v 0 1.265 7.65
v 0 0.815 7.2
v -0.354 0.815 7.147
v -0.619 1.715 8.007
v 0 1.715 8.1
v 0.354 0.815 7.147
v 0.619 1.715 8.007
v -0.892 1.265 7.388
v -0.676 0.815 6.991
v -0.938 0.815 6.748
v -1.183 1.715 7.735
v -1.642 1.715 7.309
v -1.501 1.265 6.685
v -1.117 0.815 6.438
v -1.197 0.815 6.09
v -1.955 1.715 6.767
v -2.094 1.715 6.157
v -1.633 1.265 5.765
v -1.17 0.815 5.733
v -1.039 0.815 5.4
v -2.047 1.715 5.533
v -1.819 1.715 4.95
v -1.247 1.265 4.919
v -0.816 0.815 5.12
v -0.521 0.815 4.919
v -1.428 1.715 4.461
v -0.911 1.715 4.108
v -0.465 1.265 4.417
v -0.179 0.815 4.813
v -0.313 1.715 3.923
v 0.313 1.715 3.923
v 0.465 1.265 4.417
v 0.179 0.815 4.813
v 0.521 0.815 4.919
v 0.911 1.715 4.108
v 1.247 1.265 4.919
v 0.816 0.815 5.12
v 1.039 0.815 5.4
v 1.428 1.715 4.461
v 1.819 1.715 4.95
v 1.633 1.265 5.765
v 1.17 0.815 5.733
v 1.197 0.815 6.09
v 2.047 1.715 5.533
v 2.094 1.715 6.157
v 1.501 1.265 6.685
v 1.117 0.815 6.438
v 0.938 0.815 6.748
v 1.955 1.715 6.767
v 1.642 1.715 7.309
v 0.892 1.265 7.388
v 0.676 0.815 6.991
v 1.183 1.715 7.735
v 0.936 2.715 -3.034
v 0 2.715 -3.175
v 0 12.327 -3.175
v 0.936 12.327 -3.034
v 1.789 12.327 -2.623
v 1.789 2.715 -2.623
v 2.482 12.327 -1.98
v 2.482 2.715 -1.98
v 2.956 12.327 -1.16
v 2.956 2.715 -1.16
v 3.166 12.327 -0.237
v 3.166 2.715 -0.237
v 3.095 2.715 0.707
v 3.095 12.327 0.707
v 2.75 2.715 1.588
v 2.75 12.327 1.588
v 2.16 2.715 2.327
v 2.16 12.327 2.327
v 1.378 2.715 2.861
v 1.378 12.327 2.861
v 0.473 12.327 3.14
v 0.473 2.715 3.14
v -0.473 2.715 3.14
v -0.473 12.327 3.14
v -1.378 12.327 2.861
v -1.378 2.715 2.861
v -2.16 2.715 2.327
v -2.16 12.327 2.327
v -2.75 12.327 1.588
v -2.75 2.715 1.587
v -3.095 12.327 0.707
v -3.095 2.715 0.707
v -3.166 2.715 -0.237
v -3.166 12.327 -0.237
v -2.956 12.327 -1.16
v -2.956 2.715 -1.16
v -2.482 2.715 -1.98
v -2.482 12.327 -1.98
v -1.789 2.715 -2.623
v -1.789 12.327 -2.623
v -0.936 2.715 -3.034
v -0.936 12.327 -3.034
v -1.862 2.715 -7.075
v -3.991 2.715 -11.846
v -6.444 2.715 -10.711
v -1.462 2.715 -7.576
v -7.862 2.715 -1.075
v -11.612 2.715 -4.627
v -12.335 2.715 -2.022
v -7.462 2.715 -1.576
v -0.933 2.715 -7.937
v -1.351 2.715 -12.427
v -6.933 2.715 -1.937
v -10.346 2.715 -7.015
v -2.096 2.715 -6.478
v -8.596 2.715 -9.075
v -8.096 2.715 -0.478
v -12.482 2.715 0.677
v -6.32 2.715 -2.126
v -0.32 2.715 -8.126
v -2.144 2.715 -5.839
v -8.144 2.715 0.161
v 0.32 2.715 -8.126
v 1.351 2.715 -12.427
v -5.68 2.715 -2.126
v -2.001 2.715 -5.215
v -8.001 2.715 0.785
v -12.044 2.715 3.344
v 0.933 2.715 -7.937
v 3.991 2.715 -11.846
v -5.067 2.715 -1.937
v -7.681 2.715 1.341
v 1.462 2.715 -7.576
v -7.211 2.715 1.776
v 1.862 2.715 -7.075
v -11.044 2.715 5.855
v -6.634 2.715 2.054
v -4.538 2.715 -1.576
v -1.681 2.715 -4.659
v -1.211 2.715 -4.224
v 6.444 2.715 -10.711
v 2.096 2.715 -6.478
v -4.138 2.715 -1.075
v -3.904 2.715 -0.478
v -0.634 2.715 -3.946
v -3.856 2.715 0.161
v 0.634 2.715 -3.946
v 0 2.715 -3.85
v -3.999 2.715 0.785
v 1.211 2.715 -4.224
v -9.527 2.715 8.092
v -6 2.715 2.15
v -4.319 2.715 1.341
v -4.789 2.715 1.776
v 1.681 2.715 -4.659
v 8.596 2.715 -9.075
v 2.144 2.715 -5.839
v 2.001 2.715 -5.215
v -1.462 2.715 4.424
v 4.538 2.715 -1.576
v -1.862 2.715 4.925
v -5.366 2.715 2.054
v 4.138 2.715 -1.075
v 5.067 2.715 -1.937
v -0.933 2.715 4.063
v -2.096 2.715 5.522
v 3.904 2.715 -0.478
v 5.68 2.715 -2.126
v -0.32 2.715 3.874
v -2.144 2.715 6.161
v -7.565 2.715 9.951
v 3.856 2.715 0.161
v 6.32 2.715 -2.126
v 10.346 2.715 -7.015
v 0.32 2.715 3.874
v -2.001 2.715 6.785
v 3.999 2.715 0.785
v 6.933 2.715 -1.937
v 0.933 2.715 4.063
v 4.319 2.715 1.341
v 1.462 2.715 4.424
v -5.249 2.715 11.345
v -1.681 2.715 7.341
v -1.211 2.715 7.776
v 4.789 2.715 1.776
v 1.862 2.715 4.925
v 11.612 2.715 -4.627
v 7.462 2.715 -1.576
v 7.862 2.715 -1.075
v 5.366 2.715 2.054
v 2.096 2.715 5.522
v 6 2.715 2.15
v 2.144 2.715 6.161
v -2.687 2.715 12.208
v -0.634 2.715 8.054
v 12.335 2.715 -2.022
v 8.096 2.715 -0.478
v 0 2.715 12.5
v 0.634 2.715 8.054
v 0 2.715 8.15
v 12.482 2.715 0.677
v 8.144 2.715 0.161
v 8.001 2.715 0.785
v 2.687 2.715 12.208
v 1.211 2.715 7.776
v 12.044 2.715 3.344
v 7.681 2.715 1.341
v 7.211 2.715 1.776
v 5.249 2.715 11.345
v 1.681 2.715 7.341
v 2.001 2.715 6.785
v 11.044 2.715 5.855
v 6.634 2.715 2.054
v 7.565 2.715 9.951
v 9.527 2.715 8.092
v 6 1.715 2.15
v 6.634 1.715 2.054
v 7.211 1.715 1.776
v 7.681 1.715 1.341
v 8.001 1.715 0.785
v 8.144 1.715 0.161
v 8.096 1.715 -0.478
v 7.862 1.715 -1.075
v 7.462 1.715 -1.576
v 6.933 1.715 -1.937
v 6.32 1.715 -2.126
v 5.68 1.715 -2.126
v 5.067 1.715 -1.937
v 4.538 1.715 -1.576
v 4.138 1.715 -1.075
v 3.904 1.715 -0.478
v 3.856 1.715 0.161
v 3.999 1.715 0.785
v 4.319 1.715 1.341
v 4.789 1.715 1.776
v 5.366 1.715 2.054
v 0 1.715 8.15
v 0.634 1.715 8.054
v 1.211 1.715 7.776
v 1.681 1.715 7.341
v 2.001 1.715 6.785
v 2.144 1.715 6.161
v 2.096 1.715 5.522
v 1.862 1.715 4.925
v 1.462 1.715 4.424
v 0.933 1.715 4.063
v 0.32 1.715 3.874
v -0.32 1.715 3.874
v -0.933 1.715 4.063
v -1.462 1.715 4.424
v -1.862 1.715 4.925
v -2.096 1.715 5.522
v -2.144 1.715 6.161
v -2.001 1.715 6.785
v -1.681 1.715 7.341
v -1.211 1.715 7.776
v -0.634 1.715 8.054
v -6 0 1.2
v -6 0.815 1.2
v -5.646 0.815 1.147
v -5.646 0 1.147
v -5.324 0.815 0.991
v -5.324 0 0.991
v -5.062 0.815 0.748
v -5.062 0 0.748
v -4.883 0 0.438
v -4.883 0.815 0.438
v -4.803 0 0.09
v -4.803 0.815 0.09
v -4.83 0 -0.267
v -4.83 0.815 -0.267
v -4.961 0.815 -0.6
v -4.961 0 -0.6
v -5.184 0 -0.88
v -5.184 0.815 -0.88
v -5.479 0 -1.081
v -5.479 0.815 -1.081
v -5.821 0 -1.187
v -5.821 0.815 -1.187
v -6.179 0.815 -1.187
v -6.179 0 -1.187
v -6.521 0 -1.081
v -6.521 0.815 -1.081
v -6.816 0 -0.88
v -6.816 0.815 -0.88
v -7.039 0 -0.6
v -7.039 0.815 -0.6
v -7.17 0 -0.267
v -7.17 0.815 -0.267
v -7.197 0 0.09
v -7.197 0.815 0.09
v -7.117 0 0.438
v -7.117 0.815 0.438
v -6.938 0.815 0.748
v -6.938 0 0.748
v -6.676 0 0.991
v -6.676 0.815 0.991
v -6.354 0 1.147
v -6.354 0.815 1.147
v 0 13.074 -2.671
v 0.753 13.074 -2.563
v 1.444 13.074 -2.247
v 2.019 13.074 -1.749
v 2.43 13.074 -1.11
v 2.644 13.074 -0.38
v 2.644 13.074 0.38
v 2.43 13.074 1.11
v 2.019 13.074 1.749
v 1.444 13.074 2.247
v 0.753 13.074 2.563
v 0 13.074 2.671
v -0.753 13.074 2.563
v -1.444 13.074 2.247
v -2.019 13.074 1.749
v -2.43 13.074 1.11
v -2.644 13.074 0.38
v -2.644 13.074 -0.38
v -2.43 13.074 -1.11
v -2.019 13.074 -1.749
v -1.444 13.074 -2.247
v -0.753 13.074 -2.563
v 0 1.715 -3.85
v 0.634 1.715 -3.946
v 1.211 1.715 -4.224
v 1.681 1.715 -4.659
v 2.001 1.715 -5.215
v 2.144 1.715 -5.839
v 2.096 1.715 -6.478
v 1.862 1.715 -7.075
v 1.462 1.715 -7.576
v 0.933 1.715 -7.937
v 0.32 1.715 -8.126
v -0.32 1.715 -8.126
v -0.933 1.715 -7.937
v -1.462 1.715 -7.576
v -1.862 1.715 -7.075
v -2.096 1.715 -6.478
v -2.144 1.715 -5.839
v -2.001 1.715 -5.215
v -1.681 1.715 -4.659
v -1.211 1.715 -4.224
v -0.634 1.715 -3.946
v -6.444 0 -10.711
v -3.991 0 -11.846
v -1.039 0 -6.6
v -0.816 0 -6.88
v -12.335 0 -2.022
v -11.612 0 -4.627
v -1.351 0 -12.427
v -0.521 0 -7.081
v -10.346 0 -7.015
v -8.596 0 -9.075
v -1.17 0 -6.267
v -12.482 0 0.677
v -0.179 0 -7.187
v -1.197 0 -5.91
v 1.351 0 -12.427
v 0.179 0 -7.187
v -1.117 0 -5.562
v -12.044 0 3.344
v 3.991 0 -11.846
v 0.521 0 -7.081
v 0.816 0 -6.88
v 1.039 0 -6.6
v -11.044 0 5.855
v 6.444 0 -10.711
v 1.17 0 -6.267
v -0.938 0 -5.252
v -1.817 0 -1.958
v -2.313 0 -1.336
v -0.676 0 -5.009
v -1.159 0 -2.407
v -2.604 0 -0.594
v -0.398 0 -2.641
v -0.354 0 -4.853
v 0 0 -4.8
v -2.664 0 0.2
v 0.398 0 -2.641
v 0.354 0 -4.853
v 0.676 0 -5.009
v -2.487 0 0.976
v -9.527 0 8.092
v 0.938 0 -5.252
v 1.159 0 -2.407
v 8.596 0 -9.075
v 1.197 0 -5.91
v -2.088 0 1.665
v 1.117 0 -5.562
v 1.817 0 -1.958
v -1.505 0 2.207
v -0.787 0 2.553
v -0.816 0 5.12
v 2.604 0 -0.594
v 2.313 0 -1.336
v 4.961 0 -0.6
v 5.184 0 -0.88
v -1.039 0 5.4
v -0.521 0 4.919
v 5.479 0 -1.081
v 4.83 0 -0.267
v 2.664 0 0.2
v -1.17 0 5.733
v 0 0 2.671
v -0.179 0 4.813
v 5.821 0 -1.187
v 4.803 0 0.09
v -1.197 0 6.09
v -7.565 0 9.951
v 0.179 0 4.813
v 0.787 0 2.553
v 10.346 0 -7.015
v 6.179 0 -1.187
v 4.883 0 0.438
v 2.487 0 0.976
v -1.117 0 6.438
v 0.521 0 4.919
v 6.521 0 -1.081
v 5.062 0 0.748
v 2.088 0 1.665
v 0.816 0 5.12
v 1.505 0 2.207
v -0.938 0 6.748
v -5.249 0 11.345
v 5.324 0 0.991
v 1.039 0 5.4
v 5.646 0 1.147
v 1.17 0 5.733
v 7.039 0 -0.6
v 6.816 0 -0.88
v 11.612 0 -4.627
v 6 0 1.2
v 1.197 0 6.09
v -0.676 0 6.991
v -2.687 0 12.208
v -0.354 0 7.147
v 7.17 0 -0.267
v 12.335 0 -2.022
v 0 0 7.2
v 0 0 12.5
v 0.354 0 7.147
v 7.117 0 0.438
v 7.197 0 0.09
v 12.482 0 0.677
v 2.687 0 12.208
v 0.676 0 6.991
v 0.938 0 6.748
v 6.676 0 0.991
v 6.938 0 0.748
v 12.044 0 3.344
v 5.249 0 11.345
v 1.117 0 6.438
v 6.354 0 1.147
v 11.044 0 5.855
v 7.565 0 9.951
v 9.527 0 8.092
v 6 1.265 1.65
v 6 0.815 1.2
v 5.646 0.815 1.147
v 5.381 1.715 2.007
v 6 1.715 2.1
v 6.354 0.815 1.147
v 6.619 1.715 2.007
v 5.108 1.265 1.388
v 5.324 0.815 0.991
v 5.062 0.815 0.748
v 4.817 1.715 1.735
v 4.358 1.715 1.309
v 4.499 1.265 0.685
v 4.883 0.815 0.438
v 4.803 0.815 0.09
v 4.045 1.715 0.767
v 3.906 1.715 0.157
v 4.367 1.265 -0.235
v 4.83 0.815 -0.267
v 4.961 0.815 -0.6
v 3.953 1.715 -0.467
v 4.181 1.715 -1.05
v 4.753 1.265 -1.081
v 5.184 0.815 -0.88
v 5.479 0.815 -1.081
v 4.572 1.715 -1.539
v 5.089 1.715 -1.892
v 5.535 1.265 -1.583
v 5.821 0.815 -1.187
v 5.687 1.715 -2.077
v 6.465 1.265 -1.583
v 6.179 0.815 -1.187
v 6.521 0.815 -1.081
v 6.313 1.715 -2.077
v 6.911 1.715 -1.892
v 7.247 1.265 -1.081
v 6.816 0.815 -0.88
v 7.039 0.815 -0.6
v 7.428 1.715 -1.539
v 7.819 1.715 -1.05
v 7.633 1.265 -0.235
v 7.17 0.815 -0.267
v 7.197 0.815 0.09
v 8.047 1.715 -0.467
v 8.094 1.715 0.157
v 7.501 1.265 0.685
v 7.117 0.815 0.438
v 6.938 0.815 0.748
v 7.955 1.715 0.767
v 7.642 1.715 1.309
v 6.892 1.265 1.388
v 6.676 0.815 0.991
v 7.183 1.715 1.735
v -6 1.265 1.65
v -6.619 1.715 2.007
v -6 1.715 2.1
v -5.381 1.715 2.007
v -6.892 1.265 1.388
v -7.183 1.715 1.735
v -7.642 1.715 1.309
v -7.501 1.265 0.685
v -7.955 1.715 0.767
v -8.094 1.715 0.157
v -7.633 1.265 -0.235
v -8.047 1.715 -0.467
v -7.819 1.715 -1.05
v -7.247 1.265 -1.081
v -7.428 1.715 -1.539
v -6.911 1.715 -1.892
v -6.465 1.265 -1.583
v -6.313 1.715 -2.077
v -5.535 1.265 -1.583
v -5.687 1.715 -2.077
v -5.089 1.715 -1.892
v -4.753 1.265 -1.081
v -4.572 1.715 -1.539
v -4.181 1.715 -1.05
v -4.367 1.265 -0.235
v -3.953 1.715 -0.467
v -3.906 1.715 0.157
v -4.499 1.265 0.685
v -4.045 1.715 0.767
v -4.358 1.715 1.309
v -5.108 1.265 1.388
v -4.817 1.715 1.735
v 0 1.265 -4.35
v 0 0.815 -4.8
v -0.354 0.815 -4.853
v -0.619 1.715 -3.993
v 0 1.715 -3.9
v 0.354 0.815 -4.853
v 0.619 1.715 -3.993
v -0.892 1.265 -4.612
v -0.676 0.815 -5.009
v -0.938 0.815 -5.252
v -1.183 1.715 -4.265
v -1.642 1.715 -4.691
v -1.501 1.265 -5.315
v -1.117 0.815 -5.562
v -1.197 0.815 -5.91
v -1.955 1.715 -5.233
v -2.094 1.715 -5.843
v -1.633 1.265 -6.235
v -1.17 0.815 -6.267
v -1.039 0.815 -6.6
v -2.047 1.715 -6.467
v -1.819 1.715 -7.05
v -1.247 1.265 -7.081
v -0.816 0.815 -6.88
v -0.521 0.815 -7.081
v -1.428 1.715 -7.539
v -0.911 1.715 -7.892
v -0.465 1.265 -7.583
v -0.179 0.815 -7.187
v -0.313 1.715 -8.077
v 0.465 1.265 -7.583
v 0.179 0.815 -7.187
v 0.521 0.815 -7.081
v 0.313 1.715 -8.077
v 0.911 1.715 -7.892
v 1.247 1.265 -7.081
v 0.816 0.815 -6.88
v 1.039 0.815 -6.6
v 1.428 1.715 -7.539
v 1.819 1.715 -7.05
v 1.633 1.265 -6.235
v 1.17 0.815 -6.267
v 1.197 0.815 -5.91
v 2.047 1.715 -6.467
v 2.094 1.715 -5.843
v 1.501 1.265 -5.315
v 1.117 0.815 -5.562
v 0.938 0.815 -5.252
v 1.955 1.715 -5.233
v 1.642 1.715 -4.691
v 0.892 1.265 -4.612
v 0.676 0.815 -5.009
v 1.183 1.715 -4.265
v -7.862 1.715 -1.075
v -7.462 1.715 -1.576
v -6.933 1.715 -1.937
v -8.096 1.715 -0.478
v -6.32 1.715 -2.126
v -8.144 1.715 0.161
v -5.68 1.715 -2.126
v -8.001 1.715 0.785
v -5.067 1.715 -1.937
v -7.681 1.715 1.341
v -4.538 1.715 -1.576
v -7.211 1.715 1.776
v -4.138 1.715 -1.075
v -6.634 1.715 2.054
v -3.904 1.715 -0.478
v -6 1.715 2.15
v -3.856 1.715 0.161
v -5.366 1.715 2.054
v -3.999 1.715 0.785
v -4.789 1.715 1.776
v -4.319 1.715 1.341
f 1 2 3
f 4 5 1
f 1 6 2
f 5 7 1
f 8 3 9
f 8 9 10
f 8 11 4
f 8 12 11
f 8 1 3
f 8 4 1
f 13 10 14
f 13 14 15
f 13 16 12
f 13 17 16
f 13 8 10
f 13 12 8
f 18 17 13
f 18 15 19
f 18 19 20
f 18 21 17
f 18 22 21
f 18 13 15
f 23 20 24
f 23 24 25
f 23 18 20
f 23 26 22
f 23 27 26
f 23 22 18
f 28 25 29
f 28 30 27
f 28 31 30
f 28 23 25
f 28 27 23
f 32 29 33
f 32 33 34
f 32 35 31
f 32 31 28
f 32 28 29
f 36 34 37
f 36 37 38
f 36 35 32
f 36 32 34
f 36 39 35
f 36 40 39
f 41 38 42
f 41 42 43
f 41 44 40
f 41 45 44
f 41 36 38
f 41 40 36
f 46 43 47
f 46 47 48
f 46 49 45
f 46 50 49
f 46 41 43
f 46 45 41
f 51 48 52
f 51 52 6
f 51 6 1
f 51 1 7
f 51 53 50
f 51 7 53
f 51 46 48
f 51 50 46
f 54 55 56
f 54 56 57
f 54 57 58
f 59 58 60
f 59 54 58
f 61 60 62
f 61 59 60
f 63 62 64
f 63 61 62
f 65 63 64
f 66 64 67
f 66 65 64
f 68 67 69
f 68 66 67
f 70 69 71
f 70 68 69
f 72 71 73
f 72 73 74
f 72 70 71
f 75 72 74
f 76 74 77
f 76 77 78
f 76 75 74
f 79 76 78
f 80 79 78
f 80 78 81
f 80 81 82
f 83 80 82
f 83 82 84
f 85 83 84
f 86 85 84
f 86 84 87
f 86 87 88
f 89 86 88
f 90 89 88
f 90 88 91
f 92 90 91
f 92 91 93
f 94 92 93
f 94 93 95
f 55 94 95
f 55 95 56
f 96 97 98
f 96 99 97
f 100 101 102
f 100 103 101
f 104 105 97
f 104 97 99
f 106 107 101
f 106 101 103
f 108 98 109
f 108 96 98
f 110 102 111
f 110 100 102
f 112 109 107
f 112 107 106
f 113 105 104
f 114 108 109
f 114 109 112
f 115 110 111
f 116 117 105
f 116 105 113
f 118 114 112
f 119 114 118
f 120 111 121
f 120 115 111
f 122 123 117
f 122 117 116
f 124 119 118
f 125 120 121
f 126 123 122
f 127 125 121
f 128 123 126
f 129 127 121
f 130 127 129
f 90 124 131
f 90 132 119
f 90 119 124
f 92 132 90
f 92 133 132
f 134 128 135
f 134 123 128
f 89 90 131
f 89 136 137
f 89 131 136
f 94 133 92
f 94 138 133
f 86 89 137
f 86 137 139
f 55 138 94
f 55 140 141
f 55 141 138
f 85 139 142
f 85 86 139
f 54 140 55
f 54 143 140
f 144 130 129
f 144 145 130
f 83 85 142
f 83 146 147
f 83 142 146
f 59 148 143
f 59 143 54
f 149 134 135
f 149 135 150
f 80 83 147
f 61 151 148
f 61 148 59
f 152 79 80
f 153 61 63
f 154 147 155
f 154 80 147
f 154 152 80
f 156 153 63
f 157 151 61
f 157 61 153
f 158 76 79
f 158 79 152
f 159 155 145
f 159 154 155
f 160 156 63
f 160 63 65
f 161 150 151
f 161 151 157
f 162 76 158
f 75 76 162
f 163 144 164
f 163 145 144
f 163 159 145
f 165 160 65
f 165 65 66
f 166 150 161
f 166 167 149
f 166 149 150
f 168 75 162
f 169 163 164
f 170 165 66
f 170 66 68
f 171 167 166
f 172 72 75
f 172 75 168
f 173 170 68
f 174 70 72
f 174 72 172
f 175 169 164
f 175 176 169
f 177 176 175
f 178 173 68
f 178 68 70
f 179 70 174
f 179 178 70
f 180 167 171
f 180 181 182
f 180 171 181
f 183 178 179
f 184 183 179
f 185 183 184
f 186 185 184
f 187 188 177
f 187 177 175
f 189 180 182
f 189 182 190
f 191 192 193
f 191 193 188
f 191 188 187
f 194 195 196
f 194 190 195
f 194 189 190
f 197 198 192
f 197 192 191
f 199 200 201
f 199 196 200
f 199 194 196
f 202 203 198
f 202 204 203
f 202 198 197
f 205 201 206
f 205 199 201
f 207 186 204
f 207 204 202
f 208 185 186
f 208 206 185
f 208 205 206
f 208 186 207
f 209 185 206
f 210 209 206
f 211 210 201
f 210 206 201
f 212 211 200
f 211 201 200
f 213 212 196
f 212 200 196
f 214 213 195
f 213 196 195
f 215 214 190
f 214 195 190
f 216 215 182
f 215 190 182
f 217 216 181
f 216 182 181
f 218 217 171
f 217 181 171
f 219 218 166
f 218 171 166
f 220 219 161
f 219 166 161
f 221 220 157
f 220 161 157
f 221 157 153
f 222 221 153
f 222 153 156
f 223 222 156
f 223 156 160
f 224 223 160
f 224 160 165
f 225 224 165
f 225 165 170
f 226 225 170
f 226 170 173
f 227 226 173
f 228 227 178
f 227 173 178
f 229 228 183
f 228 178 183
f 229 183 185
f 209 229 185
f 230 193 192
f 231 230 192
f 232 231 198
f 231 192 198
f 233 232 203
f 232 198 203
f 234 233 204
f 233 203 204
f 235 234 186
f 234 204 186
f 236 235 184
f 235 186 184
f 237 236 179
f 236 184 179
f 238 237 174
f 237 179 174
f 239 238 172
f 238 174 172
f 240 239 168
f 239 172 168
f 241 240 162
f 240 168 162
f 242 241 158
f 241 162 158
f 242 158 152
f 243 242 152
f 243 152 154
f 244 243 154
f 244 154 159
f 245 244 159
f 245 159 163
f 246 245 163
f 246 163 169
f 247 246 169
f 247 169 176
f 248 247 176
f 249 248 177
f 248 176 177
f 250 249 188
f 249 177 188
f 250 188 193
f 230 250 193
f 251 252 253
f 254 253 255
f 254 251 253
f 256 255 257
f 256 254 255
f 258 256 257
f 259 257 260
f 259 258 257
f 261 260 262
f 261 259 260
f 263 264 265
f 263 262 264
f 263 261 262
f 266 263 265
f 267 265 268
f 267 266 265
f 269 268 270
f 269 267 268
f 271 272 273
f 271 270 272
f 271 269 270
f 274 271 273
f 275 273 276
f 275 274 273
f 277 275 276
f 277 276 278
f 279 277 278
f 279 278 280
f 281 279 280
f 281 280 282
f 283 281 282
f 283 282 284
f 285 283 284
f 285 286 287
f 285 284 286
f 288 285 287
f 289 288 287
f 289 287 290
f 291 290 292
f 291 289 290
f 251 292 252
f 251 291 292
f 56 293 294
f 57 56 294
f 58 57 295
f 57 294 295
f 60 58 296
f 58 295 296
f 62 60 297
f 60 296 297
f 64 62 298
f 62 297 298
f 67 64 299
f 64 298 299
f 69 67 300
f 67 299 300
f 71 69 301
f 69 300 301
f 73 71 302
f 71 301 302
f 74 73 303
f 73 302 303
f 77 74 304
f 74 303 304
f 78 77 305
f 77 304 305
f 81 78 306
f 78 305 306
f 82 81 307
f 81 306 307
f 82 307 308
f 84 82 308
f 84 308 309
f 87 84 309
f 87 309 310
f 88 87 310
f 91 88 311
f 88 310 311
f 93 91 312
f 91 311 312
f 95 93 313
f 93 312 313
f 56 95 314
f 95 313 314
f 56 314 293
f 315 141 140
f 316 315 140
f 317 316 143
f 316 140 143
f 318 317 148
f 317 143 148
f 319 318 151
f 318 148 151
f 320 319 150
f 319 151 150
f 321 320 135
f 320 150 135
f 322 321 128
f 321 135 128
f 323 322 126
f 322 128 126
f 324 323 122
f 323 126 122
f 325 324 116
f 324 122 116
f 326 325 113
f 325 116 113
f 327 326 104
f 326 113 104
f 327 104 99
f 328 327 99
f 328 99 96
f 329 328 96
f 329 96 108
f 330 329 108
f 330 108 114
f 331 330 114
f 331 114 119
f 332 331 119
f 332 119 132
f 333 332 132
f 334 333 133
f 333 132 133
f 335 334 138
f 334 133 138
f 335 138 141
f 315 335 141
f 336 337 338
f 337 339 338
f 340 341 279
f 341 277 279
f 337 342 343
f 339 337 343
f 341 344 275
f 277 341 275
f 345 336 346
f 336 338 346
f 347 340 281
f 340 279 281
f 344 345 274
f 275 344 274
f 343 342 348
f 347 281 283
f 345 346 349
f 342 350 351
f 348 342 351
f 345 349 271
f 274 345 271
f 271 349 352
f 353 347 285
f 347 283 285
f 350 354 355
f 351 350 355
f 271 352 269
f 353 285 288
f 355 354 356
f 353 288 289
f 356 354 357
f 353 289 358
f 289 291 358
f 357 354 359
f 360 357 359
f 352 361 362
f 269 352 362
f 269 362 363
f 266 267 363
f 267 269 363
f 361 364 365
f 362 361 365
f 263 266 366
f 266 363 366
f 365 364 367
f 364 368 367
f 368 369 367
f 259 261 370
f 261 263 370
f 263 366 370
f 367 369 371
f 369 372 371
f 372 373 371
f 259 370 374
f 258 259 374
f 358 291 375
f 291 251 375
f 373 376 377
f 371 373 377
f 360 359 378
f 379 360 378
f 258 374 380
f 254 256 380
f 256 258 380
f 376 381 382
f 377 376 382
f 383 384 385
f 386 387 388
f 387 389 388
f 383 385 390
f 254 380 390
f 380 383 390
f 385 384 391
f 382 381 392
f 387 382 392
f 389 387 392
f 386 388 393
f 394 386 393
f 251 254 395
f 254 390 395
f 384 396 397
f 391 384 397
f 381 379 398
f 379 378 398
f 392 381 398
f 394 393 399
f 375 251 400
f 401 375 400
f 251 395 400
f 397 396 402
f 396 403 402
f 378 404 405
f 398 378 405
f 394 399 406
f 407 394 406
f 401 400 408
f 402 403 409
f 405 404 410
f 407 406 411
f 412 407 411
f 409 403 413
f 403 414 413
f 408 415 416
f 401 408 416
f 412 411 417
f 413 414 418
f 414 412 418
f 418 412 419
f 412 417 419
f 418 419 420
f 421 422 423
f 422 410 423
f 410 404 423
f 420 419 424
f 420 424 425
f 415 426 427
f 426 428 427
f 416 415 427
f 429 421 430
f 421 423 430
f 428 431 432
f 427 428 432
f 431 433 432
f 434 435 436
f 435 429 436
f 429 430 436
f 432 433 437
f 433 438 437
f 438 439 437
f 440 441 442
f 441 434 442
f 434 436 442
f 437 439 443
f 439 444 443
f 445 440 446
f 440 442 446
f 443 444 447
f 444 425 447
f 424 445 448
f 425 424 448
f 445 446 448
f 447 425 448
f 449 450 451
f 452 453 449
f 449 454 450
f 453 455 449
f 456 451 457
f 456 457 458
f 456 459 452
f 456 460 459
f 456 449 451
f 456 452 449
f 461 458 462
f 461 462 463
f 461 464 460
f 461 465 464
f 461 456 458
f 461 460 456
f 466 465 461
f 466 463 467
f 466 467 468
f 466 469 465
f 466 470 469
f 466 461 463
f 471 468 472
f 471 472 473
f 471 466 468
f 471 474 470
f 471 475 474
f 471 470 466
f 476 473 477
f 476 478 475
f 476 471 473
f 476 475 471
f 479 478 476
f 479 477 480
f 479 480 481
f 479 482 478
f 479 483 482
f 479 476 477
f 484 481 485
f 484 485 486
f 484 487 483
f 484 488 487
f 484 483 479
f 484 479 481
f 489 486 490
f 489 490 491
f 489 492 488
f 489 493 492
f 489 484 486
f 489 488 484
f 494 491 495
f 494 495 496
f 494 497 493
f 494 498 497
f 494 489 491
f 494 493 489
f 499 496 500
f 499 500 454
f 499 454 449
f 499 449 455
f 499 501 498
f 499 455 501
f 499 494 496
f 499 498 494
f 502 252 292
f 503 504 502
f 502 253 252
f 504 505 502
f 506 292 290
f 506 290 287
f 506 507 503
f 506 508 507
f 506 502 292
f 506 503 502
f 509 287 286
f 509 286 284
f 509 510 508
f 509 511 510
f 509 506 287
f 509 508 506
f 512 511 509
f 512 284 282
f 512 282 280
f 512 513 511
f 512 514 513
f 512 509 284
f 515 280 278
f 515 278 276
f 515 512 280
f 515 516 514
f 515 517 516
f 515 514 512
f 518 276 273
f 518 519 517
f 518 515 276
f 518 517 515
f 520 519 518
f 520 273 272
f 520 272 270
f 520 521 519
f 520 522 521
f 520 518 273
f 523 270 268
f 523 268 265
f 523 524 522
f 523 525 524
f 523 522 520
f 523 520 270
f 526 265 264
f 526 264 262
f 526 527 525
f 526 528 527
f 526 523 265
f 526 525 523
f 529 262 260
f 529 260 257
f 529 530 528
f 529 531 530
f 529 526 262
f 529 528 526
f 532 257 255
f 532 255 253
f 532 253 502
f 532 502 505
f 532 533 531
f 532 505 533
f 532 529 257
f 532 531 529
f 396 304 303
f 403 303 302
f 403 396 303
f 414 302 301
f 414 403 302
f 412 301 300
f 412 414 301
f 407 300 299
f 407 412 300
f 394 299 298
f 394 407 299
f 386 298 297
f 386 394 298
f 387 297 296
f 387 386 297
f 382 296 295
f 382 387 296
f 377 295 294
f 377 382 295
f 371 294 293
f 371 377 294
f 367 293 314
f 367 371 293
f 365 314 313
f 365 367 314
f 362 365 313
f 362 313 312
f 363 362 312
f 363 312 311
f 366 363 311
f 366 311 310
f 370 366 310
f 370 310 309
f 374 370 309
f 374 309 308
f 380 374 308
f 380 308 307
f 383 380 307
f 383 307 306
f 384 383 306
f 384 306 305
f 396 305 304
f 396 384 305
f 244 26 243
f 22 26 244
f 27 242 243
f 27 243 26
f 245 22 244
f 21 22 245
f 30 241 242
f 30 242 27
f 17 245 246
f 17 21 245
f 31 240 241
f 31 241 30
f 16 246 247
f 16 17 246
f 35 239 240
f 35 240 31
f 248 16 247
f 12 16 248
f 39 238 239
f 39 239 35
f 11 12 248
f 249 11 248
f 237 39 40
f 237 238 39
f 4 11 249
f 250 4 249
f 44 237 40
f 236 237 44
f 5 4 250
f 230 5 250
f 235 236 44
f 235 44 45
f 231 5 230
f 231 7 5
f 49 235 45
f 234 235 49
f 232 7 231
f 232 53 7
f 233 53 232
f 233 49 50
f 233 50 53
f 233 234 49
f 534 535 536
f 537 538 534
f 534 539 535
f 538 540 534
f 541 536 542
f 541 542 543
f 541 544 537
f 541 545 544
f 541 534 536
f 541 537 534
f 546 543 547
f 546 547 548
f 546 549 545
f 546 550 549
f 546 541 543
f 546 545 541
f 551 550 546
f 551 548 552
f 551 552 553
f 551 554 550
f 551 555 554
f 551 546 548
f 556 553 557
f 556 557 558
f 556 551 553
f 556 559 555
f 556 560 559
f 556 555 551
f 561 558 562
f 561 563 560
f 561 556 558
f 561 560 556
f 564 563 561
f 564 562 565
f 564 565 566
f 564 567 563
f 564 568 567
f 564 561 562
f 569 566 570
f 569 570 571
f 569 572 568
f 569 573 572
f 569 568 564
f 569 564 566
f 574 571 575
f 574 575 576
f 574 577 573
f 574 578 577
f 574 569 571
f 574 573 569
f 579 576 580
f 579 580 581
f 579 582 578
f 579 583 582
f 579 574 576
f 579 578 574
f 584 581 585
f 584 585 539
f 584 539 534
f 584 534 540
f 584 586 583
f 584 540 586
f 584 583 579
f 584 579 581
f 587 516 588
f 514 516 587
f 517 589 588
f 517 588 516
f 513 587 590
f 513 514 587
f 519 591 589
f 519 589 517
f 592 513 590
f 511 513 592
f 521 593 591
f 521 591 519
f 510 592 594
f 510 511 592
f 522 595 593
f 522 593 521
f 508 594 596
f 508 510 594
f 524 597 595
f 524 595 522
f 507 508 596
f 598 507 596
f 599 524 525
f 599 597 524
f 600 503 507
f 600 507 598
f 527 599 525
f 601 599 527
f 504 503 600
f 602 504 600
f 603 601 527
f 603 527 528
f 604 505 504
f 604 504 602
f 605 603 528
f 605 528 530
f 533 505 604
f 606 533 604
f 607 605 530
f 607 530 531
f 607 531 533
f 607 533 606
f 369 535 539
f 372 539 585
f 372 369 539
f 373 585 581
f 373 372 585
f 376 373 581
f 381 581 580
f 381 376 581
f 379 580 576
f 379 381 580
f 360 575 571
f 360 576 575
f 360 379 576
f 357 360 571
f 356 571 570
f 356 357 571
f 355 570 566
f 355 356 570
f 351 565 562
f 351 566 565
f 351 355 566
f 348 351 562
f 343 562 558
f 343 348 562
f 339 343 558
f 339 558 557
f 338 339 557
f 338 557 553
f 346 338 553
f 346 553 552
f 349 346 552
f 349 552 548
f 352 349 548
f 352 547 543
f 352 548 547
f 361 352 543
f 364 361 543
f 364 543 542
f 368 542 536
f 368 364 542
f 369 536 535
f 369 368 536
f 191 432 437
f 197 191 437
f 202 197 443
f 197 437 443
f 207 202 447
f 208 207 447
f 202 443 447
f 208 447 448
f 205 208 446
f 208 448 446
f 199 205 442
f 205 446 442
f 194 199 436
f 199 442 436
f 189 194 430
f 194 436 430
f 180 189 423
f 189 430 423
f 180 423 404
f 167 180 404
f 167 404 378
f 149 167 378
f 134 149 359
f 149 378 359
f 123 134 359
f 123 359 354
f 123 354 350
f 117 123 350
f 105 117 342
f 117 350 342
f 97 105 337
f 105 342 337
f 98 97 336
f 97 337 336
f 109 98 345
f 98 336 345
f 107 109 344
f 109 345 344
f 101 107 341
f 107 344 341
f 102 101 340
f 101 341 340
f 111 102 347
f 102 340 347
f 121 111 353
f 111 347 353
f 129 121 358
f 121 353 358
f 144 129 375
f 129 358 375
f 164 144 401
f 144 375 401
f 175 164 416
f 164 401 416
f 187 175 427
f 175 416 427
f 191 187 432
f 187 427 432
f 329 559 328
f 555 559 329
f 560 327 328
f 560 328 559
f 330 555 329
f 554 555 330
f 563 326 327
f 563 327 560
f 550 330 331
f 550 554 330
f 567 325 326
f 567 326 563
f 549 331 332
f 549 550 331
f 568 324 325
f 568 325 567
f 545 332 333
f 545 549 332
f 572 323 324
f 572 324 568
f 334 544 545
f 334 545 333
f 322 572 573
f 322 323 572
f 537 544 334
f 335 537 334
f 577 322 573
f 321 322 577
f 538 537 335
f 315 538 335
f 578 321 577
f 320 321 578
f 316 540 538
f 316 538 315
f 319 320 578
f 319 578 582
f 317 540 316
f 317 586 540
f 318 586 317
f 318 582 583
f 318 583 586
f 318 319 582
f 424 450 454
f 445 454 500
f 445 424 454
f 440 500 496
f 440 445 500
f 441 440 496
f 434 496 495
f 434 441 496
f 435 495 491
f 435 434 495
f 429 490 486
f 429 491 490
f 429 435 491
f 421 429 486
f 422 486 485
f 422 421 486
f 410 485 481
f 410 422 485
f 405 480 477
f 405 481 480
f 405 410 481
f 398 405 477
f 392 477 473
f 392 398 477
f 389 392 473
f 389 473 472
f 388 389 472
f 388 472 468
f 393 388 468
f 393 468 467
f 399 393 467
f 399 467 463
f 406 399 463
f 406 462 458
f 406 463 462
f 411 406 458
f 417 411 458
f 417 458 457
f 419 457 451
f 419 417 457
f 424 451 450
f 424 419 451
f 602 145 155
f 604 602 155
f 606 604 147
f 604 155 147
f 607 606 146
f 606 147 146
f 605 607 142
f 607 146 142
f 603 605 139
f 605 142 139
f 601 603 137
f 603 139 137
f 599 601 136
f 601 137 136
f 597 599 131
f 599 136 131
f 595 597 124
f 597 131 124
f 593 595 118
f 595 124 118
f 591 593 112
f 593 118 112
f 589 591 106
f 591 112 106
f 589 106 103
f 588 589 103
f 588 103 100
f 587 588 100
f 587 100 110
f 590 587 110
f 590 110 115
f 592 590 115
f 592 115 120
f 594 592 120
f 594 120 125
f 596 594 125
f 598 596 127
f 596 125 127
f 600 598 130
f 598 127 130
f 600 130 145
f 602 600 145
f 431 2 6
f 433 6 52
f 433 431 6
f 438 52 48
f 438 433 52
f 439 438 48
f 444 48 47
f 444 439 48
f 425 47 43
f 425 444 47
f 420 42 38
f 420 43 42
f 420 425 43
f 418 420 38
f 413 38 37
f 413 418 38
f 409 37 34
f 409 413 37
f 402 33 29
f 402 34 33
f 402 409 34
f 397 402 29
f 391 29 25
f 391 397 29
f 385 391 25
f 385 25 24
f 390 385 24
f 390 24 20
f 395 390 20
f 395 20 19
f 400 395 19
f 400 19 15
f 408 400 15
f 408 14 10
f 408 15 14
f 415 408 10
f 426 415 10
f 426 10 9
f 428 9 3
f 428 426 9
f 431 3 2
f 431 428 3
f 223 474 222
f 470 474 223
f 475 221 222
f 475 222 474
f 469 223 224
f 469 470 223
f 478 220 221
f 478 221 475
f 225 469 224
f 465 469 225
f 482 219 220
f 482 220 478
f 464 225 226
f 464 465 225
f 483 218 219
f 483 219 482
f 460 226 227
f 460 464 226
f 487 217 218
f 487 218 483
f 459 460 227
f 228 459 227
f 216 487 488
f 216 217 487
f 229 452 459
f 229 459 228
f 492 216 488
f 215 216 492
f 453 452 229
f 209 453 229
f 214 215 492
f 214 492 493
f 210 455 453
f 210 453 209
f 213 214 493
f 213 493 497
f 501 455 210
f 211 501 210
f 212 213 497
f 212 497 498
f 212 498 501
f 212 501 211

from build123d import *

# Parameters (mm, degrees)
SKETCH1_R           = 12.5
SKETCH1_R_2         = 2.37125
SKETCH1_R_3         = 1.2
BOSS_EXTRUDE1_DEPTH = 2.715
SKETCH2_R           = 2.15
SKETCH2_R_2         = 3.175
CUT_EXTRUDE1_DEPTH  = 1
CHAMFER1_SIZE       = 0.9
SKETCH3_R           = 3.175
SKETCH3_R_2         = 2.37125
BOSS_EXTRUDE2_DEPTH = 13.81
CUT_EXTRUDE2_START  = -13.81
SKETCH4_R           = 2.67125
SKETCH4_R_2         = 2.37125
CUT_EXTRUDE2_DEPTH  = 13.81
CHAMFER2_SIZE       = 1.482560969
CHAMFER2_SIZE_2     = 1


with BuildPart() as part:
    # Sketch1 → Boss-Extrude1 (new body)
    with BuildSketch(Plane(origin=(0, 0, 0), x_dir=(1, 0, 0), z_dir=(0, 1, 0))):
        with Locations(Location((0, 0, 0), (0, 0, 270))):
            Circle(SKETCH1_R)
        with Locations(Location((0, 0, 0), (0, 0, 270))):
            Circle(SKETCH1_R_2, mode=Mode.SUBTRACT)
        with Locations(Location((0, -6, 0), (0, 0, 270))):
            Circle(SKETCH1_R_3, mode=Mode.SUBTRACT)
        with Locations(Location((-6, 0, 0), (0, 0, 270))):
            Circle(SKETCH1_R_3, mode=Mode.SUBTRACT)
        with Locations(Location((0, 6, 0), (0, 0, 270))):
            Circle(SKETCH1_R_3, mode=Mode.SUBTRACT)
        with Locations(Location((6, 0, 0), (0, 0, 270))):
            Circle(SKETCH1_R_3, mode=Mode.SUBTRACT)
    extrude(amount=BOSS_EXTRUDE1_DEPTH)

    # Sketch2 → Cut-Extrude1 (cut)
    with BuildSketch(Plane(origin=(0, 2.715, 0), x_dir=(1, 0, 0), z_dir=(0, 1, 0))):
        with Locations(Location((0, 6, 0), (0, 0, 270))):
            Circle(SKETCH2_R)
        with Locations(Location((-6, 0, 0), (0, 0, 270))):
            Circle(SKETCH2_R)
        with Locations(Location((6, 0, 0), (0, 0, 270))):
            Circle(SKETCH2_R)
        with Locations(Location((0, -6, 0), (0, 0, 270))):
            Circle(SKETCH2_R)
        with Locations(Location((0, 0, 0), (0, 0, 270))):
            Circle(SKETCH2_R_2)
    extrude(amount=-CUT_EXTRUDE1_DEPTH, mode=Mode.SUBTRACT)

    # Chamfer1
    # the kernel refuses this chamfer: 0.9 mm, written as the material it takes off along each edge
    with BuildSketch(Plane(origin=(0, 1.715, 6), x_dir=(0, 0, 1), z_dir=(1, 0, 0))) as chamfer1_piece_1:
        Polygon((1.2, CHAMFER1_SIZE), (1.2 + CHAMFER1_SIZE, 0), (1.2, 0), align=None)
    revolve(axis=Axis((0, 1.715, 6), (0, -1, 0)), mode=Mode.SUBTRACT)
    with BuildSketch(Plane(origin=(6, 1.715, 0), x_dir=(0, 0, 1), z_dir=(1, 0, 0))) as chamfer1_piece_2:
        Polygon((1.2, CHAMFER1_SIZE), (1.2 + CHAMFER1_SIZE, 0), (1.2, 0), align=None)
    revolve(axis=Axis((6, 1.715, 0), (0, -1, 0)), mode=Mode.SUBTRACT)
    with BuildSketch(Plane(origin=(0, 1.715, 0), x_dir=(0, 0, 1), z_dir=(1, 0, 0))) as chamfer1_piece_3_section:
        Polygon((2.37125, CHAMFER1_SIZE), (2.37125 + CHAMFER1_SIZE, 0), (2.37125, 0), align=None)
    chamfer1_piece_3 = revolve(axis=Axis((0, 1.715, 0), (0, -1, 0)), mode=Mode.PRIVATE)
    chamfer1_piece_3 = chamfer1_piece_3 & Plane(origin=(0, 1.217857085, 0), x_dir=(0, 0, 1), z_dir=(0, 1, 0)) * Cylinder(3.175, 14, mode=Mode.PRIVATE)
    add(chamfer1_piece_3, mode=Mode.SUBTRACT)
    with BuildSketch(Plane(origin=(-6, 1.715, 0), x_dir=(0, 0, 1), z_dir=(1, 0, 0))) as chamfer1_piece_4:
        Polygon((1.2, CHAMFER1_SIZE), (1.2 + CHAMFER1_SIZE, 0), (1.2, 0), align=None)
    revolve(axis=Axis((-6, 1.715, 0), (0, -1, 0)), mode=Mode.SUBTRACT)
    with BuildSketch(Plane(origin=(0, 1.715, -6), x_dir=(0, 0, 1), z_dir=(1, 0, 0))) as chamfer1_piece_5:
        Polygon((1.2, CHAMFER1_SIZE), (1.2 + CHAMFER1_SIZE, 0), (1.2, 0), align=None)
    revolve(axis=Axis((0, 1.715, -6), (0, -1, 0)), mode=Mode.SUBTRACT)

    # Sketch3 → Boss-Extrude2 (add)
    with BuildSketch(Plane.XZ):
        with Locations(Location((0, 0, 0), (0, 0, 270))):
            Circle(SKETCH3_R)
        with Locations(Location((0, 0, 0), (0, 0, 270))):
            Circle(SKETCH3_R_2, mode=Mode.SUBTRACT)
    extrude(amount=-BOSS_EXTRUDE2_DEPTH)

    # Sketch4 → Cut-Extrude2 (cut)
    with BuildSketch(Plane(origin=(0, 13.81, 0), x_dir=(1, 0, 0), z_dir=(0, 1, 0)).offset(CUT_EXTRUDE2_START)):
        with Locations(Location((0, 0, 0), (0, 0, 270))):
            Circle(SKETCH4_R)
        Circle(SKETCH4_R_2, mode=Mode.SUBTRACT)
    extrude(amount=CUT_EXTRUDE2_DEPTH, mode=Mode.SUBTRACT)

    # Chamfer2
    # the kernel refuses this chamfer: 1.482560969, 1 mm, written as the material it takes off along each edge
    with BuildSketch(Plane(origin=(0, 13.81, 0), x_dir=(0, 0, -1), z_dir=(-1, 0, 0))) as chamfer2_piece_1:
        Polygon((3.175, CHAMFER2_SIZE), (3.175 - CHAMFER2_SIZE_2, 0), (3.175, 0), align=None)
    revolve(axis=Axis((0, 13.81, 0), (0, -1, 0)), mode=Mode.SUBTRACT)


solid = part.part
